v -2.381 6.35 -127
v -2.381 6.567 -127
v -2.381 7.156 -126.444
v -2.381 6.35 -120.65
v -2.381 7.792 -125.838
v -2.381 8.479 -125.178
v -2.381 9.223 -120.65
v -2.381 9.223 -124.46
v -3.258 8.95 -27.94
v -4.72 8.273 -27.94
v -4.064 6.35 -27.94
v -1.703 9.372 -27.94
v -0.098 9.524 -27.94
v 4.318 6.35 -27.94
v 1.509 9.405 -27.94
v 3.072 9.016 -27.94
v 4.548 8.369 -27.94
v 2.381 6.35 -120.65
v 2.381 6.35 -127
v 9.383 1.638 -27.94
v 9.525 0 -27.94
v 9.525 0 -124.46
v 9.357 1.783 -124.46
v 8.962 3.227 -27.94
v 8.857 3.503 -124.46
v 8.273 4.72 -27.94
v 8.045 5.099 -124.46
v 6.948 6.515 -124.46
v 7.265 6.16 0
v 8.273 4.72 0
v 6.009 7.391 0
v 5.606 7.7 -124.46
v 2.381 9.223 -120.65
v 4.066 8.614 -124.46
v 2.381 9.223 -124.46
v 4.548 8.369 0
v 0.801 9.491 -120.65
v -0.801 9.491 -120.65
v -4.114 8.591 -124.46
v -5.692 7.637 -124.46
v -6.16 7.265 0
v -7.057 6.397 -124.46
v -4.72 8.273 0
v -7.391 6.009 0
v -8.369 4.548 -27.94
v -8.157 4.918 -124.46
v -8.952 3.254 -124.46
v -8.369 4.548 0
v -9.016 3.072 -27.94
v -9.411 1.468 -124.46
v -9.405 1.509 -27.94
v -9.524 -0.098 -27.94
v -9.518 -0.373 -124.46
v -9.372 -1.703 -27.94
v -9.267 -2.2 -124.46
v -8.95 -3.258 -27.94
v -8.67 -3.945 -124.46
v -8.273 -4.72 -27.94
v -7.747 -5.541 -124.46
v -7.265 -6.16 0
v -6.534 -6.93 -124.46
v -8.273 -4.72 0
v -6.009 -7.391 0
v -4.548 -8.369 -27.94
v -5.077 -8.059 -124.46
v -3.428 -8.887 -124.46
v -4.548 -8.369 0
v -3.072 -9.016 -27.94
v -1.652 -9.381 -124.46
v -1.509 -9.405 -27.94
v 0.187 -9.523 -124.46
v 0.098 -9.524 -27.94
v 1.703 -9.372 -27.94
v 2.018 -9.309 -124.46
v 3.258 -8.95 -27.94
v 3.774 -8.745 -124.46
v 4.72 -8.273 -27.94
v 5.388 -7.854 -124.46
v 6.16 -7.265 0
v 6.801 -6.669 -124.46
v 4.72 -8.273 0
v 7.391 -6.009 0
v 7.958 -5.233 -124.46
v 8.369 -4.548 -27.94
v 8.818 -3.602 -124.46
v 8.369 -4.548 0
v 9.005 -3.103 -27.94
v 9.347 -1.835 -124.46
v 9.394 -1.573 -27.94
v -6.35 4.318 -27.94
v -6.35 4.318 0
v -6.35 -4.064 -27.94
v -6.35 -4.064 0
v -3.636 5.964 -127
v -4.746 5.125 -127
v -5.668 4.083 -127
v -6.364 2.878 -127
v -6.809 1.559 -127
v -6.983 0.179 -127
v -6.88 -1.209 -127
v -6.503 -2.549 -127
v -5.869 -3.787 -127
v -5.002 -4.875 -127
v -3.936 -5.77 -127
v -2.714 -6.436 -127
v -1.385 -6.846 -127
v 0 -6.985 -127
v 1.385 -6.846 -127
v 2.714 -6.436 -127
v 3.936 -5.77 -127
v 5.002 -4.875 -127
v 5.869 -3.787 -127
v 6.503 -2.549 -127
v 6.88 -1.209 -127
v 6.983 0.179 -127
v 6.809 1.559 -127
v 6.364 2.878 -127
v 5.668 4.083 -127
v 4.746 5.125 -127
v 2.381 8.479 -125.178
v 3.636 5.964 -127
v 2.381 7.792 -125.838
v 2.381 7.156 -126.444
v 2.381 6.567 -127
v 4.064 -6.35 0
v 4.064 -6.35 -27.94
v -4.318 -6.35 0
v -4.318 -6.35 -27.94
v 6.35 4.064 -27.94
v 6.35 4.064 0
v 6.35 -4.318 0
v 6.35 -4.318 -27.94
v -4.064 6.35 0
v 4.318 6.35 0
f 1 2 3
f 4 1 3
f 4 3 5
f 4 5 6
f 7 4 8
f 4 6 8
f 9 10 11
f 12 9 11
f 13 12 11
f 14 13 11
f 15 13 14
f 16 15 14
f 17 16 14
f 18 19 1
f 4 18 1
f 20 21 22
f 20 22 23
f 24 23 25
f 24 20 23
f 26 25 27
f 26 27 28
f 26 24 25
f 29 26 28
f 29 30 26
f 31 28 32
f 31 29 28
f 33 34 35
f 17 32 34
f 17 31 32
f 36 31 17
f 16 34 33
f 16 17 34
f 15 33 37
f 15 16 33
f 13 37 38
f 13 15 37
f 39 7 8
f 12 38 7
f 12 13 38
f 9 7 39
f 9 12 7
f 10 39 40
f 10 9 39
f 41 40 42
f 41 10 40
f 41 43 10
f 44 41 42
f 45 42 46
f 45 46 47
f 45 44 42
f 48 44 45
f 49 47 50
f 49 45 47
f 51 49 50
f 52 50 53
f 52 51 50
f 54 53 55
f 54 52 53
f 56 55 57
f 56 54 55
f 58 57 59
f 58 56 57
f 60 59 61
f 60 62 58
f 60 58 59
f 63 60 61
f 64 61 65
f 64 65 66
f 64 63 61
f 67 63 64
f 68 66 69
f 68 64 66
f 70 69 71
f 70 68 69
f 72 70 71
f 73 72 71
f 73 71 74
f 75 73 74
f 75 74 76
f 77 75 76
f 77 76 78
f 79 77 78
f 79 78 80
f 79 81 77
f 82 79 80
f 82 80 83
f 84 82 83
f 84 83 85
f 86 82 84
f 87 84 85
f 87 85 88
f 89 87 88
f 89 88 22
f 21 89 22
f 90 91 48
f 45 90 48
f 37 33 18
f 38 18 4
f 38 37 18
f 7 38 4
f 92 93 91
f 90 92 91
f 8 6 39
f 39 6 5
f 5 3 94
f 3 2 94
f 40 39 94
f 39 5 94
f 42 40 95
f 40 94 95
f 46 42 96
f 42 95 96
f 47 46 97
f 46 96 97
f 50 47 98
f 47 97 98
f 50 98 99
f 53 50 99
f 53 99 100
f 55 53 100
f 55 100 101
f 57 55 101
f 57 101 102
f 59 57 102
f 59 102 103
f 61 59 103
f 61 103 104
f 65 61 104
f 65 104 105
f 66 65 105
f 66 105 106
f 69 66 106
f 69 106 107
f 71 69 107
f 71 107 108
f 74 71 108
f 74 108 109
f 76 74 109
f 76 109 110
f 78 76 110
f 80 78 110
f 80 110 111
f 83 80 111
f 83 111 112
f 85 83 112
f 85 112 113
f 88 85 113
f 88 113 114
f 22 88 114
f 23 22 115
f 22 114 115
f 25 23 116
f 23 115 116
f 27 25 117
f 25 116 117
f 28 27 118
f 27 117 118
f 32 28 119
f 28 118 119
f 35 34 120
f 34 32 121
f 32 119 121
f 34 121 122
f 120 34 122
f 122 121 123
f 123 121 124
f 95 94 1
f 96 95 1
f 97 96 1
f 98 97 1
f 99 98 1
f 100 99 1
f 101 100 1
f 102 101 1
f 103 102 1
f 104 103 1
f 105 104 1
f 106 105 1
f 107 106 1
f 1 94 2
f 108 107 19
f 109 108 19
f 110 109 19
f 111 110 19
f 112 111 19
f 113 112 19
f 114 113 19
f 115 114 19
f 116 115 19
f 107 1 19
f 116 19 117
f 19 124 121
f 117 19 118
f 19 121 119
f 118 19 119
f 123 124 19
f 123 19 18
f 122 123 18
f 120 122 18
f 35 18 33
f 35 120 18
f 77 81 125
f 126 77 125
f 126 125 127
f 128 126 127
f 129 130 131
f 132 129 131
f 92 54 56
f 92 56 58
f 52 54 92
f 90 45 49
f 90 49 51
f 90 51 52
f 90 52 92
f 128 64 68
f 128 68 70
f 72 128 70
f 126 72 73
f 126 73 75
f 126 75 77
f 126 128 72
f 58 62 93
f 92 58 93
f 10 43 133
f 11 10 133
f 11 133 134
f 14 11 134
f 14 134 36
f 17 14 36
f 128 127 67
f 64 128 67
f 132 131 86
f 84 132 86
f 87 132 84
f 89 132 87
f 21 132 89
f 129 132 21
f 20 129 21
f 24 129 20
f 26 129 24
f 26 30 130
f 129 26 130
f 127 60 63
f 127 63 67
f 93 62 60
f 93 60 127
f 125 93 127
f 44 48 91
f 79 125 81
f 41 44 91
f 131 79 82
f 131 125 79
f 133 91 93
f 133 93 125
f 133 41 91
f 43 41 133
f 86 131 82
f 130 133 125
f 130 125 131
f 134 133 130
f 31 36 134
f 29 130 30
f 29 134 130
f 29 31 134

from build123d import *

# Parameters (mm, degrees)
SKETCH1_R           = 9.525
BOSS_EXTRUDE1_DEPTH = 127
SKETCH2_W           = 4.7625
SKETCH2_H           = 3.175
CUT_EXTRUDE1_DEPTH  = 6.35
CHAMFER1_SIZE       = 2.54
CUT_EXTRUDE2_DEPTH  = 27.94


with BuildPart() as part:
    # Sketch1 → Boss-Extrude1 (new body)
    with BuildSketch(Plane.XY):
        Circle(SKETCH1_R)
    extrude(amount=-BOSS_EXTRUDE1_DEPTH)

    # Sketch2 → Cut-Extrude1 (cut)
    with BuildSketch(Plane(origin=(0, 0, -127), x_dir=(-1, 0, 0), z_dir=(0, 0, -1))):
        with Locations((0, 7.9375)):
            Rectangle(SKETCH2_W, SKETCH2_H)
    extrude(amount=-CUT_EXTRUDE1_DEPTH, mode=Mode.SUBTRACT)

    # Chamfer1
    chamfer1_edges = [part.edges().sort_by_distance(p)[0] for p in [
        (-5.83284745, -7.530173678, -127),
    ]]
    chamfer(chamfer1_edges, length=CHAMFER1_SIZE)

    # Sketch3 → Cut-Extrude2 (cut)
    with BuildSketch(Plane.XY):
        with BuildLine():
            Line((-4.720377059, 8.273068682), (-4.064, 6.35))
            Line((-4.064, 6.35), (4.318, 6.35))
            Line((4.318, 6.35), (4.548298042, 8.368907331))
            ThreePointArc((4.548298042, 8.368907331), (-0.098483799, 9.524490849), (-4.720377059, 8.273068682))
        make_face()
        with BuildLine():
            Line((8.273068682, 4.720377059), (6.35, 4.064))
            Line((6.35, 4.064), (6.35, -4.318))
            Line((6.35, -4.318), (8.368907331, -4.548298042))
            ThreePointArc((8.368907331, -4.548298042), (9.524490849, 0.098483799), (8.273068682, 4.720377059))
        make_face()
        with BuildLine():
            Line((4.720377059, -8.273068682), (4.064, -6.35))
            Line((4.064, -6.35), (-4.318, -6.35))
            Line((-4.318, -6.35), (-4.548298042, -8.368907331))
            ThreePointArc((-4.548298042, -8.368907331), (0.098483799, -9.524490849), (4.720377059, -8.273068682))
        make_face()
        with BuildLine():
            Line((-8.273068682, -4.720377059), (-6.35, -4.064))
            Line((-6.35, -4.064), (-6.35, 4.318))
            Line((-6.35, 4.318), (-8.368907331, 4.548298042))
            ThreePointArc((-8.368907331, 4.548298042), (-9.524490849, -0.098483799), (-8.273068682, -4.720377059))
        make_face()
    extrude(amount=-CUT_EXTRUDE2_DEPTH, mode=Mode.SUBTRACT)


solid = part.part
